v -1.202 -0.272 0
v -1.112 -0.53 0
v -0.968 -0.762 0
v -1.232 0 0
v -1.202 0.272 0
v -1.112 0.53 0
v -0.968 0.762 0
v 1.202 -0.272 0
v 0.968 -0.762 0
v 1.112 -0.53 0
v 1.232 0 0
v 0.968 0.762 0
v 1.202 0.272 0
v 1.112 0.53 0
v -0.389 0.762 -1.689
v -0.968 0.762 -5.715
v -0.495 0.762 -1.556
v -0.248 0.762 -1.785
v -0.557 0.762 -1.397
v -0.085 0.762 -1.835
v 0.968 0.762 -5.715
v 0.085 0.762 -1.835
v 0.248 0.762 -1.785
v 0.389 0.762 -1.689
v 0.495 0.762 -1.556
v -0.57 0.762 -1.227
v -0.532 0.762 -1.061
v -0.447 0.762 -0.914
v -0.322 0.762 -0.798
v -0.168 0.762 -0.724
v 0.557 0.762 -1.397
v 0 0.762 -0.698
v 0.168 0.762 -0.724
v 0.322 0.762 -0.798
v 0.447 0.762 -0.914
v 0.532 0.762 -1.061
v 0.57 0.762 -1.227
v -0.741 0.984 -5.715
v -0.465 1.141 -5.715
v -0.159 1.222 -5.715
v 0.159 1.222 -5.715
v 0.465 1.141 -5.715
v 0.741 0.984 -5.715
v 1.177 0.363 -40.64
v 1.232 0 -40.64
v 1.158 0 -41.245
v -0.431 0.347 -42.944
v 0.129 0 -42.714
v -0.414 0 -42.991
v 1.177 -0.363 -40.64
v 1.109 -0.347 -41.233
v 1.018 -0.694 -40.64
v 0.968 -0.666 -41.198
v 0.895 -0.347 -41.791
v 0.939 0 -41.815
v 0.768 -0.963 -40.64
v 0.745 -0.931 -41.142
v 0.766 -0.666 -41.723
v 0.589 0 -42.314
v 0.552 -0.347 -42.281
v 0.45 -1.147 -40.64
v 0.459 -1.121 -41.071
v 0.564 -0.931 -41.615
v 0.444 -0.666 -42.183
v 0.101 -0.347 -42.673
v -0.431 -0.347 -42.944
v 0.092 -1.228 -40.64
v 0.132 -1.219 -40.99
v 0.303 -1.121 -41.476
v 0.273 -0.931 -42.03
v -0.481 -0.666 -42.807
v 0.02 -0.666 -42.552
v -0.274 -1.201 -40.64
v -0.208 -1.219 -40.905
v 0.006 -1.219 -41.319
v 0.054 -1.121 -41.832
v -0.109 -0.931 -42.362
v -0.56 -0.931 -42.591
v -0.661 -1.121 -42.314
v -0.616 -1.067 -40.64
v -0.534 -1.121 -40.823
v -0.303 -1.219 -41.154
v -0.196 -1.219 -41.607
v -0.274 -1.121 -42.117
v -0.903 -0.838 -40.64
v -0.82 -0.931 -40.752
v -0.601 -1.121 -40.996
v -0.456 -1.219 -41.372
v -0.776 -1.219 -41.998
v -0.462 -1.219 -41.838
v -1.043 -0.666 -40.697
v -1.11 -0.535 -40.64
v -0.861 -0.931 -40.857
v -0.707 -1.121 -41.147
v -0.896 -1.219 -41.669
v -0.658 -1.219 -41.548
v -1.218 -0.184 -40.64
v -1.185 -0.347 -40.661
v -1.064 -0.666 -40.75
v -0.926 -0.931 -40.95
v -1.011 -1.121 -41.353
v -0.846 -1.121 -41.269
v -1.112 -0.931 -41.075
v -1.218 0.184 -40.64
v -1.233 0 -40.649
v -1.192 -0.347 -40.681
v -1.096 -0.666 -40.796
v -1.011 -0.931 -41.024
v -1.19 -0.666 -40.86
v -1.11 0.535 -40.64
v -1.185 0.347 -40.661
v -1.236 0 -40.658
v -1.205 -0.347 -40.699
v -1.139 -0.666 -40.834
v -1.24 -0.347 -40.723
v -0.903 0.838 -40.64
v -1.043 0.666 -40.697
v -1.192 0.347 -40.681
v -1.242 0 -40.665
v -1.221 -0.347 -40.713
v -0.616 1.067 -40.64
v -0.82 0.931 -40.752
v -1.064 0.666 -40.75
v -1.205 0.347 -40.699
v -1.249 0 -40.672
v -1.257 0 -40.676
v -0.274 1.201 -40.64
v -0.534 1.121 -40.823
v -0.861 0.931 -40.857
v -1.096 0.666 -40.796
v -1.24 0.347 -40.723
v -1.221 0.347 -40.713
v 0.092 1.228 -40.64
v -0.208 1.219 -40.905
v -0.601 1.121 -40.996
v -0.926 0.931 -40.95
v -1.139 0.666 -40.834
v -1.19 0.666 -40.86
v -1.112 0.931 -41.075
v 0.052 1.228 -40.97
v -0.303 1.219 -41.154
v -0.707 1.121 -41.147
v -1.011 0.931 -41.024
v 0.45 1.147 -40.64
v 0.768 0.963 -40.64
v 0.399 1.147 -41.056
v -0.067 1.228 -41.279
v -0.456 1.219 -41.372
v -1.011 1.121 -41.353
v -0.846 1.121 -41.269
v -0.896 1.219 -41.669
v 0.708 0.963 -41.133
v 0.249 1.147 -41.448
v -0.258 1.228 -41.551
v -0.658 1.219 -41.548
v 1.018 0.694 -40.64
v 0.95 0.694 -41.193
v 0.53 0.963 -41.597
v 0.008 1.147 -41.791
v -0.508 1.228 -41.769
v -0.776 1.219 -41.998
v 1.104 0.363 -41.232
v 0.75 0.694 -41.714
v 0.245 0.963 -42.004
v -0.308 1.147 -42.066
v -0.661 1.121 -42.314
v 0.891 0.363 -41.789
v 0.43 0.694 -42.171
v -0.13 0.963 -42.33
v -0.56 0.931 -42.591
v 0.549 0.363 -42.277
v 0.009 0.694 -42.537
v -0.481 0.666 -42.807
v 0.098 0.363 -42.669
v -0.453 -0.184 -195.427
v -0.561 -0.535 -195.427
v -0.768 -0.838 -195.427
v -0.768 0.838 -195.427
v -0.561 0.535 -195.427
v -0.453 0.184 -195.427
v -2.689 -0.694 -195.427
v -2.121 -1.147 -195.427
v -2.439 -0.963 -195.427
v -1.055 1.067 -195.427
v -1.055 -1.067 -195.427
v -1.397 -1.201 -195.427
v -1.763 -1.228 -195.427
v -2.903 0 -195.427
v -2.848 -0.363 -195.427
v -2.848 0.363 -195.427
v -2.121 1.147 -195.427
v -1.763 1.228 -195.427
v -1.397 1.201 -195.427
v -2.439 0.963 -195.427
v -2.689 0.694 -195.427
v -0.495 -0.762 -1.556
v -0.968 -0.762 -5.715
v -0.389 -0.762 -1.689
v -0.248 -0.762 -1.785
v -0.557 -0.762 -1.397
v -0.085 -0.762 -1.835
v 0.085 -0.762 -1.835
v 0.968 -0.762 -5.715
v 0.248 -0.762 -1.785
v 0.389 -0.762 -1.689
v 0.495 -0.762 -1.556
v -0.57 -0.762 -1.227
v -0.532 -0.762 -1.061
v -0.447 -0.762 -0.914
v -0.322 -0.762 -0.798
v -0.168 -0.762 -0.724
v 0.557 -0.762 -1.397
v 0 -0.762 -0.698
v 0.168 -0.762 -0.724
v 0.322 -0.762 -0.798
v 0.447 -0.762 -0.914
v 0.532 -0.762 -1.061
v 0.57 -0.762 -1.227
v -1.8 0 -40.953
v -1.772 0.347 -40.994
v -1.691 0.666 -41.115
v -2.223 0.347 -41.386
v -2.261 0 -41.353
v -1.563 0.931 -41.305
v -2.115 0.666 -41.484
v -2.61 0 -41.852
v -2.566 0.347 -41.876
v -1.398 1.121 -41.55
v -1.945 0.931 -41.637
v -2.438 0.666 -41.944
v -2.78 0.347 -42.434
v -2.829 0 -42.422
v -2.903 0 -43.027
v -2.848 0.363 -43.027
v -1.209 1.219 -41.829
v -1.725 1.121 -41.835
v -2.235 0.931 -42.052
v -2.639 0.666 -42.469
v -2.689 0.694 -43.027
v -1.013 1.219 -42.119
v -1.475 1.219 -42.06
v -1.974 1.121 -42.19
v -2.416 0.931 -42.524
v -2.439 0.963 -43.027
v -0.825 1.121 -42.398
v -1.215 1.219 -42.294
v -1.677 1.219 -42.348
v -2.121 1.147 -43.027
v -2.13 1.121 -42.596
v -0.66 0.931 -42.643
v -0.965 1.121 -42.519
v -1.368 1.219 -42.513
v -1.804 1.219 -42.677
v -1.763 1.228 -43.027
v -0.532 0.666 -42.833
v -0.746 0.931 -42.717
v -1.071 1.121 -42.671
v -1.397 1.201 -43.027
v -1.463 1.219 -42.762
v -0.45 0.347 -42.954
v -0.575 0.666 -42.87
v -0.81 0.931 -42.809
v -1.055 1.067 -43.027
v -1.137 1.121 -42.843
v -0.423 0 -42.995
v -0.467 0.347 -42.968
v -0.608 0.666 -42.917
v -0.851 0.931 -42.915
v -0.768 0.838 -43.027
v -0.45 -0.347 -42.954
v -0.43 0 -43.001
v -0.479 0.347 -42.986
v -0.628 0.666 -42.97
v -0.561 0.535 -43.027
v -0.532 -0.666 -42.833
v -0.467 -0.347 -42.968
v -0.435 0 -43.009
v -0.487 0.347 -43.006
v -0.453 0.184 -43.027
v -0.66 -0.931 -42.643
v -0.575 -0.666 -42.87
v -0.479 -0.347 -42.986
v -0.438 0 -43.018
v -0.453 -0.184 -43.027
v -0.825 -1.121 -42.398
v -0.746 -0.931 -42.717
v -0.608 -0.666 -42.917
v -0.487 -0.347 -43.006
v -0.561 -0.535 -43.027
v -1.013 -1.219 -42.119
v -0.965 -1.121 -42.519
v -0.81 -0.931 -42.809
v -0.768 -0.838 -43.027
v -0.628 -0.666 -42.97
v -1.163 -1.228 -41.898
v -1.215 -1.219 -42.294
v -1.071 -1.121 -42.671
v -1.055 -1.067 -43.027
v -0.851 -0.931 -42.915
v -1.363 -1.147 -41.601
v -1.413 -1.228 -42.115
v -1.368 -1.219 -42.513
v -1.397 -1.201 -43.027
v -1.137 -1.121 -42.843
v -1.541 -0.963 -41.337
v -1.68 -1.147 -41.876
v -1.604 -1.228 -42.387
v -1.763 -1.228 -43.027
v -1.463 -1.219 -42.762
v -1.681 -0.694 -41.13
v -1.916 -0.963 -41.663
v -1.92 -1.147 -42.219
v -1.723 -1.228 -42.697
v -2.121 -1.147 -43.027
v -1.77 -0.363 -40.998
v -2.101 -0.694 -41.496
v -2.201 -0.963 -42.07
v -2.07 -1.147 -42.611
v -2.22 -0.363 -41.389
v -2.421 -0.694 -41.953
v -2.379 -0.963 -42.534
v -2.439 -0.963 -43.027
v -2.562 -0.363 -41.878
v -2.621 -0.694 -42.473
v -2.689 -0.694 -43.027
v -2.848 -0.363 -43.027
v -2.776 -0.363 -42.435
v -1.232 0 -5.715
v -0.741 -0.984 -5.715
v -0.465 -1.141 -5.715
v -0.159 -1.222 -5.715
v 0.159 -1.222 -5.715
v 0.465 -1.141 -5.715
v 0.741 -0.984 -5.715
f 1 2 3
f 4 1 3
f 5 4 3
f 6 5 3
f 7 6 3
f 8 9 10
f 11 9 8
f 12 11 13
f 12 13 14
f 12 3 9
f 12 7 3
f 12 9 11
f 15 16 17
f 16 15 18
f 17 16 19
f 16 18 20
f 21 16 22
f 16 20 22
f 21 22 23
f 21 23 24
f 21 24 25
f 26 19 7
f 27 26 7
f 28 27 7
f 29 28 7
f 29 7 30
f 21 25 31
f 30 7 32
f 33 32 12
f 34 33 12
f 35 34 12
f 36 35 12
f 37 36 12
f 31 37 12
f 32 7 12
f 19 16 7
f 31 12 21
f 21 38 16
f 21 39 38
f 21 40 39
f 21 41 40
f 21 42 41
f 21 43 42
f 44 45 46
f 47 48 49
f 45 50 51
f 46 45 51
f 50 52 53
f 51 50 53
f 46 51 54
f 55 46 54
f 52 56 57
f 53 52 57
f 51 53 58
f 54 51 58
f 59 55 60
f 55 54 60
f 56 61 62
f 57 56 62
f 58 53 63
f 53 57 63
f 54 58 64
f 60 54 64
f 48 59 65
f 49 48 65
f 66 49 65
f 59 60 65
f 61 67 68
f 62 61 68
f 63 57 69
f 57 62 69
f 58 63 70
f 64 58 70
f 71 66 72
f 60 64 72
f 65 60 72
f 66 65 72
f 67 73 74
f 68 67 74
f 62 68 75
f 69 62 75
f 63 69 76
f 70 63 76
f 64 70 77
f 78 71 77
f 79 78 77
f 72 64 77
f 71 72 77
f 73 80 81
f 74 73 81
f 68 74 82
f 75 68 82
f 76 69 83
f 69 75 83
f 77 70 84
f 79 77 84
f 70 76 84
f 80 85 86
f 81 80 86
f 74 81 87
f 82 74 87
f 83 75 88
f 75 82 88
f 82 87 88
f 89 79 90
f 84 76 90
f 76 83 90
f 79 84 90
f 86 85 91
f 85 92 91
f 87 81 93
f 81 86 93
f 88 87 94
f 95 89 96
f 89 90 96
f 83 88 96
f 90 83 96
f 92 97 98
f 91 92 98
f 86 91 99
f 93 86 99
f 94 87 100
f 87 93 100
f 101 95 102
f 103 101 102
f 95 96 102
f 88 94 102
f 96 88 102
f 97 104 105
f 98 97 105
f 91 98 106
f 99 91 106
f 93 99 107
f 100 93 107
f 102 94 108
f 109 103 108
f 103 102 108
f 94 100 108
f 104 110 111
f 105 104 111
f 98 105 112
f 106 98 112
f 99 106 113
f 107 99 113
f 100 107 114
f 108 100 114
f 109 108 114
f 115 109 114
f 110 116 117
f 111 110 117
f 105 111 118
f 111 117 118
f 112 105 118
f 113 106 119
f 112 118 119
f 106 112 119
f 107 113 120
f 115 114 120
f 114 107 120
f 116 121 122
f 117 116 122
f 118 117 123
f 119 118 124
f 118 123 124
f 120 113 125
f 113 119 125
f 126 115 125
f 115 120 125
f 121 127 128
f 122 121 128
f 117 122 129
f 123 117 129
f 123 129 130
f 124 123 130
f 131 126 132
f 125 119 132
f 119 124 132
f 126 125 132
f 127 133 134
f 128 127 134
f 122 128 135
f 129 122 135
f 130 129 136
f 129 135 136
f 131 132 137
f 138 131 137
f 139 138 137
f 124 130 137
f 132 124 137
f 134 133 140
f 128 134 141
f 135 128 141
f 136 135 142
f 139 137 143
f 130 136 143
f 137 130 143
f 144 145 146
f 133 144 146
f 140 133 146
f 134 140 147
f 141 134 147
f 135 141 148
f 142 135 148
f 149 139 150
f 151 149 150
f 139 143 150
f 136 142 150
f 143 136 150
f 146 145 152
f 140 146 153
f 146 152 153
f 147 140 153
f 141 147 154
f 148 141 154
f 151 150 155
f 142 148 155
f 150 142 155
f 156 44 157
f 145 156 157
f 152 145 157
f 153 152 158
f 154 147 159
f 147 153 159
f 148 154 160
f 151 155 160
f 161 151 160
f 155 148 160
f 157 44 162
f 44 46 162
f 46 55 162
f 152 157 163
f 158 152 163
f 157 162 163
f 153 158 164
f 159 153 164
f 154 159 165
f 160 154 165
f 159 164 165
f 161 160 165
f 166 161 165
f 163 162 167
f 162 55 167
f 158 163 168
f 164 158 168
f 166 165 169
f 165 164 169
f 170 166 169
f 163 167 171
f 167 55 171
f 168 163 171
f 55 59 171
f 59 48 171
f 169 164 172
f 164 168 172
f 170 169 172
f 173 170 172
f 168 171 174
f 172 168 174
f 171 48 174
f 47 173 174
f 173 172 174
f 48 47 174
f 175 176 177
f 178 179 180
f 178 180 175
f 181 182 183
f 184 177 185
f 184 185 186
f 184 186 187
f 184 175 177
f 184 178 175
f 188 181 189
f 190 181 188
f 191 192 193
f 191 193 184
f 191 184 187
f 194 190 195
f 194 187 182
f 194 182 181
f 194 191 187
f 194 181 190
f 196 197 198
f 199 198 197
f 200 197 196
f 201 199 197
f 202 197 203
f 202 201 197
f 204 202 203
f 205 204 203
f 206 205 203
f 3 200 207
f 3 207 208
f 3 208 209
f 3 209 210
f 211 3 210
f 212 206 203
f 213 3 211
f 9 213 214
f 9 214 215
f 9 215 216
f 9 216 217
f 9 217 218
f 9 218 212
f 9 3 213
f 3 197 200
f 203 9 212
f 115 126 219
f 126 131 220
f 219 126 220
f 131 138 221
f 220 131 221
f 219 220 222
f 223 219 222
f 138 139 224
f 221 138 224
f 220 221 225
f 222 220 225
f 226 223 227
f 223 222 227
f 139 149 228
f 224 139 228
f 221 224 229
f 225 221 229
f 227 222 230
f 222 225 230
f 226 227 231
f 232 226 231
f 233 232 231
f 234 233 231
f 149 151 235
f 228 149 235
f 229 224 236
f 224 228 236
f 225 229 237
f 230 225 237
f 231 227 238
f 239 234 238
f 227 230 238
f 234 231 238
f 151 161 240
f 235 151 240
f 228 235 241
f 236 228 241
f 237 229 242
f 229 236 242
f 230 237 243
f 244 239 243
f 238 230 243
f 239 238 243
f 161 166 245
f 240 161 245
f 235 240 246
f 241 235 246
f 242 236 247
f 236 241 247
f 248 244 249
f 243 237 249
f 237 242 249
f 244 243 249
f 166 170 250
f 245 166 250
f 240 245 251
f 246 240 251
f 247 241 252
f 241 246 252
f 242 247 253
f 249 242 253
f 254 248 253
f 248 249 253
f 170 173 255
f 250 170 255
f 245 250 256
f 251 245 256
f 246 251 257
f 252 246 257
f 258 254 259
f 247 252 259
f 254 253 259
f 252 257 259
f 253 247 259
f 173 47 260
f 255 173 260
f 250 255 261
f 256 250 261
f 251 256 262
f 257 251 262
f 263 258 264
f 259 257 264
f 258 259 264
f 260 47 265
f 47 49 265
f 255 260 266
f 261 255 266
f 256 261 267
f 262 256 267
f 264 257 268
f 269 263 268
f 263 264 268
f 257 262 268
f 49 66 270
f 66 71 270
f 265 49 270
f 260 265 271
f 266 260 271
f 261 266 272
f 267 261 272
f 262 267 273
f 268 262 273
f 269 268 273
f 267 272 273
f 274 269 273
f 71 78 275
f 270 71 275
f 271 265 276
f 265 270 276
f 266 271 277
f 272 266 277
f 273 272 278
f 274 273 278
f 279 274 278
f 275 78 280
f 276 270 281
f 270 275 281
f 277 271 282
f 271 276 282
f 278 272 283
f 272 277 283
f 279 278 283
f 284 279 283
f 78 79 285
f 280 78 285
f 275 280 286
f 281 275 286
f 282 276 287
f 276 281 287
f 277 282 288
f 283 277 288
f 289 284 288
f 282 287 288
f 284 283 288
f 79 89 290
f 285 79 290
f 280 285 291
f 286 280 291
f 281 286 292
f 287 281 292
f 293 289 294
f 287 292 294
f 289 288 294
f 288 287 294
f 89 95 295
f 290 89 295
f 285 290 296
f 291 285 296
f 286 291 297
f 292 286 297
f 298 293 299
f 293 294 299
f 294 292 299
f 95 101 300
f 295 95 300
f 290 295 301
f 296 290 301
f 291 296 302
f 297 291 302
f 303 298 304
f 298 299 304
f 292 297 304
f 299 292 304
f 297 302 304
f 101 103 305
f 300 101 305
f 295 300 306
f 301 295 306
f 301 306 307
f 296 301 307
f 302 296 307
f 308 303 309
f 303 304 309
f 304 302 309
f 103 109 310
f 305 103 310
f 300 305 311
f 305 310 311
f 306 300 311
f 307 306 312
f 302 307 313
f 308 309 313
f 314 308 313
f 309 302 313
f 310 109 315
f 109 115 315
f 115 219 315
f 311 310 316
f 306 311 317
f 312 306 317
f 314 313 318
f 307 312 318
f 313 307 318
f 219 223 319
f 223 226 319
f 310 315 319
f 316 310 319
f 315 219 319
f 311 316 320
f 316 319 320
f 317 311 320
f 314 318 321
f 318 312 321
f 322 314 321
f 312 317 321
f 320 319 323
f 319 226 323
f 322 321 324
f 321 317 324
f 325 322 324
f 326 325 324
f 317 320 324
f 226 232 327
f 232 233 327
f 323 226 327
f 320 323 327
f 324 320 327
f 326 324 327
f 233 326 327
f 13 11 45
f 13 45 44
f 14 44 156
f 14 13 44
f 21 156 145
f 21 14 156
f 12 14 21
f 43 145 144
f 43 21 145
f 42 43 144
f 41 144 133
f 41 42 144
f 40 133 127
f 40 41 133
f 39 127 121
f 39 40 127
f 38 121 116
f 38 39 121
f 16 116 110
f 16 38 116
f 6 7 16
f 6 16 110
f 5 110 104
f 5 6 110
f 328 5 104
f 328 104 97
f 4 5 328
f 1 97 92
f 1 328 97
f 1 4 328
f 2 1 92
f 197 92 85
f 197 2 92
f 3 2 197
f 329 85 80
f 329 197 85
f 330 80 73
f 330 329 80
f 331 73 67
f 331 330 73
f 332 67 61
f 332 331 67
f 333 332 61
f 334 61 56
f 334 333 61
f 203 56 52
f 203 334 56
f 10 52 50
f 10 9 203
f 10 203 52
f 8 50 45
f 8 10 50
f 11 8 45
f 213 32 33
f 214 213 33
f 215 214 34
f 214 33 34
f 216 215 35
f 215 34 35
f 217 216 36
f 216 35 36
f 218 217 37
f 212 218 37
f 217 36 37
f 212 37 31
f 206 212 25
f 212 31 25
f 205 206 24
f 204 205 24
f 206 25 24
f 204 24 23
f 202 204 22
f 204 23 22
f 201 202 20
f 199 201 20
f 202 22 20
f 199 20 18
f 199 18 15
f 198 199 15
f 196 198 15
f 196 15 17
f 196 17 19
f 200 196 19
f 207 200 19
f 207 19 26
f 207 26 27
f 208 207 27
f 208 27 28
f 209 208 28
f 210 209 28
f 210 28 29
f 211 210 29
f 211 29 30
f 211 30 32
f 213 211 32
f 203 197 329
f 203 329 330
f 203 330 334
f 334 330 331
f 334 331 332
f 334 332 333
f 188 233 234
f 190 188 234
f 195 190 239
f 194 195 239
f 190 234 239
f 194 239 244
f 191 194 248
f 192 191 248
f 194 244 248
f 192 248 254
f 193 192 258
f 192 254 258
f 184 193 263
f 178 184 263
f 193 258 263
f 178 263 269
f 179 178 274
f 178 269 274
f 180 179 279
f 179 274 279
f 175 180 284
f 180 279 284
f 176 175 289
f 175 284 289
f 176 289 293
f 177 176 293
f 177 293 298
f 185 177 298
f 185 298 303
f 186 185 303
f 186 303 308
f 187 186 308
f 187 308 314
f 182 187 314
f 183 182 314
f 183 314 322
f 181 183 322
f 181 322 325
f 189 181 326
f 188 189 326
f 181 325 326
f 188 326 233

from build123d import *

# Parameters (mm, degrees)
SKETCH1_R    = 1.2319
RODEND_DEPTH = 40.64
SKETCH2_W    = 6.35
SKETCH2_H    = 2.4638
SKETCH2_W_2  = 2.4638
SKETCH2_H_2  = 1.524
FLATS_DEPTH  = 5.715
SKETCH3_R    = 0.5715
HOLE_DEPTH   = 41.707527741
SKETCH4_R    = 1.2319
REV1_ANGLE   = 70
SKETCH6_R    = 1.2319
REV2_ANGLE   = 70
SKETCH10_R   = 1.2319
SHAFT_DEPTH  = 152.4


with BuildPart() as part:
    # Sketch1 → RodEnd (new body)
    with BuildSketch(Plane.XY):
        Circle(SKETCH1_R)
    extrude(amount=-RODEND_DEPTH)

    # Sketch2 → Flats (cut)
    with BuildSketch(Plane.XY):
        Rectangle(SKETCH2_W, SKETCH2_H)
        Rectangle(SKETCH2_W_2, SKETCH2_H_2, mode=Mode.SUBTRACT)
    extrude(amount=-FLATS_DEPTH, mode=Mode.SUBTRACT)

    # Sketch3 → Hole (cut, through all)
    with BuildSketch(Plane(origin=(0, 0.762, 0), x_dir=(1, 0, 0), z_dir=(0, 1, 0))):
        with Locations(Location((0, 1.27, 0), (0, 0, 270))):
            Circle(SKETCH3_R)
    extrude(amount=-HOLE_DEPTH, mode=Mode.SUBTRACT)

    # Sketch4 → Rev1 (revolve)
    with BuildSketch(Plane(origin=(0, 0, -40.64), x_dir=(-1, 0, 0), z_dir=(0, 0, -1))):
        with Locations(Location((0, 0, 0), (0, 0, 180))):
            Circle(SKETCH4_R)
    revolve(axis=Axis((-1.27, 0, -40.64), (0, 1, 0)), revolution_arc=REV1_ANGLE)

    # Sketch6 → Rev2 (revolve)
    with BuildSketch(Plane(origin=(-14.18288245, 0, -5.162147048), x_dir=(-0.3420201433256661, 0, 0.9396926207859093), z_dir=(-0.9396926207859094, 0, -0.34202014332566616))):
        with Locations((-39.024742527, 0)):
            Circle(SKETCH6_R)
    revolve(axis=Axis((-0.401268836, 0, -43.026819257), (0, -1, 0)), revolution_arc=REV2_ANGLE)

    # Sketch10 → Shaft (add)
    with BuildSketch(Plane(origin=(0, 0, -43.026819257), x_dir=(-1, 0, 0), z_dir=(0, 0, -1))):
        with Locations((1.671268836, 0)):
            Circle(SKETCH10_R)
    extrude(amount=SHAFT_DEPTH)


solid = part.part
